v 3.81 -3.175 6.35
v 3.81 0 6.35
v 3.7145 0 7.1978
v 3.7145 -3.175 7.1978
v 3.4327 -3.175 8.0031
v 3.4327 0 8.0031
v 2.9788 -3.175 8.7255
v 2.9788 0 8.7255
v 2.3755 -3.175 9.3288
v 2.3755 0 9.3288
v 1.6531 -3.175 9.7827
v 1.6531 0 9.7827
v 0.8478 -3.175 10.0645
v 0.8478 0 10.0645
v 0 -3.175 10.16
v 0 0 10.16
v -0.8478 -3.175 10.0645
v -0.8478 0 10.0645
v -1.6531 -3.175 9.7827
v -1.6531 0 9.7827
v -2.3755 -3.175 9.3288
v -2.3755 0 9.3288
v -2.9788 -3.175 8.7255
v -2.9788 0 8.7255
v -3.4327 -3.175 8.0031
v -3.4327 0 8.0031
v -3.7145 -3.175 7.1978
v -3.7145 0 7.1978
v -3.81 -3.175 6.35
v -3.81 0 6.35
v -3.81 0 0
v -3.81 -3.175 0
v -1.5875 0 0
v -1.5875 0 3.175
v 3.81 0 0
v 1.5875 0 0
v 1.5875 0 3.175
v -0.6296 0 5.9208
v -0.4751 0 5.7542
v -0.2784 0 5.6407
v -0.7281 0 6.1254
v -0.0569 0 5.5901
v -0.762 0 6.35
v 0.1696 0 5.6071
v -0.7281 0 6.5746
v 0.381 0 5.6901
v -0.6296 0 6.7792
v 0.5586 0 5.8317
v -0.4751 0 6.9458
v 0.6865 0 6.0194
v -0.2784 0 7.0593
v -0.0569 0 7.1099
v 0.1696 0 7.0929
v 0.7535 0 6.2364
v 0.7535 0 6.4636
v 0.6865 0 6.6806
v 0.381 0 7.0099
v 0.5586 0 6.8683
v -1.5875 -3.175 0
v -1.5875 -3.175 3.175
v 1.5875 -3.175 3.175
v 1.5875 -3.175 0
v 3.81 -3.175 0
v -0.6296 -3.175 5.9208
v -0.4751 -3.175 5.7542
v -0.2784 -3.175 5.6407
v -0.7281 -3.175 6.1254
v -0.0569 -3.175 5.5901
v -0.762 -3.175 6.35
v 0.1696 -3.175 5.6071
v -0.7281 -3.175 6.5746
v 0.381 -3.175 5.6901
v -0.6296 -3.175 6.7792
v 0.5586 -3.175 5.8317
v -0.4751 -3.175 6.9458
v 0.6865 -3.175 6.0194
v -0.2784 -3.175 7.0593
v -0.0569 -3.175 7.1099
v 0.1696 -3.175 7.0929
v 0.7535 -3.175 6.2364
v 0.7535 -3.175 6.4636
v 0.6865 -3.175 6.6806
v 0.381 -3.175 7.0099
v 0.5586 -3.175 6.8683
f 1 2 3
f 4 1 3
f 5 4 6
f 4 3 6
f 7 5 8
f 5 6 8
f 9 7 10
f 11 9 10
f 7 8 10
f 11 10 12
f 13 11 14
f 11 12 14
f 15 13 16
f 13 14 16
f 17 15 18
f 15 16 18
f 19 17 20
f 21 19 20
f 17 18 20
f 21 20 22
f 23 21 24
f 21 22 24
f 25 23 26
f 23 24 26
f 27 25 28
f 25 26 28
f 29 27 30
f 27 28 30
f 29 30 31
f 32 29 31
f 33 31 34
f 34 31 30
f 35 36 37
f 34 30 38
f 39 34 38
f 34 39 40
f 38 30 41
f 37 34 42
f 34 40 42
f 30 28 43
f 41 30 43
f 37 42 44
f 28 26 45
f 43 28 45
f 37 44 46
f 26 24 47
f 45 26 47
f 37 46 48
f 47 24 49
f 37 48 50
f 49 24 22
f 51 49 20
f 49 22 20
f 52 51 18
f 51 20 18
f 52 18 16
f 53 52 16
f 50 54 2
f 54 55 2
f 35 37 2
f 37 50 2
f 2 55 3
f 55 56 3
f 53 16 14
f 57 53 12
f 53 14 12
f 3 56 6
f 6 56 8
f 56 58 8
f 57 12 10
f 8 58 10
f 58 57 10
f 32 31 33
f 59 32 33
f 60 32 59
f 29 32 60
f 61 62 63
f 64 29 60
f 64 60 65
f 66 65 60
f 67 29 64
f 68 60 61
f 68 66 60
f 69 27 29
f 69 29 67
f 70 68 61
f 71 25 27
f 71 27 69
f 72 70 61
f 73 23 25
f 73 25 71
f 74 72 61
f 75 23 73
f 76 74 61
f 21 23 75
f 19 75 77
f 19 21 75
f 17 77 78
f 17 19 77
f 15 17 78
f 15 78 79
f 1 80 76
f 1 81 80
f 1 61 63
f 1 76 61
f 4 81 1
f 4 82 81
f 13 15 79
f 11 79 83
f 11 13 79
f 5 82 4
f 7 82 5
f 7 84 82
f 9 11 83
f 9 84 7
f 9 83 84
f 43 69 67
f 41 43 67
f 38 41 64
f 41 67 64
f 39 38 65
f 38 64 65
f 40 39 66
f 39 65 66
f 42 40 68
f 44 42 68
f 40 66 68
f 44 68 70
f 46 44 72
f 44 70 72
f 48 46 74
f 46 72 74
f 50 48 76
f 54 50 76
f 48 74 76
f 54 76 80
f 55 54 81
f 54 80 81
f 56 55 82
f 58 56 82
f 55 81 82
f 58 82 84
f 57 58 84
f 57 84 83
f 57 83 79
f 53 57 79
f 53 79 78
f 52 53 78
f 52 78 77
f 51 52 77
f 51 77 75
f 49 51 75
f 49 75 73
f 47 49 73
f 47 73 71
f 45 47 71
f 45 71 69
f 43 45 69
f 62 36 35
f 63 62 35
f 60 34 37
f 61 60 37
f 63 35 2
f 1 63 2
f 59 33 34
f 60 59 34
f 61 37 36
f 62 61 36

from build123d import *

# Parameters (mm, degrees)
F1_DEPTH = 3.175
F2_D     = 1.524


with BuildPart() as f1:
    # F0 (on Front) → F1 (new body)
    with BuildSketch(Plane.XZ):
        with BuildLine():
            Line((-3.81, 6.35), (-3.81, 0))
            Line((-3.81, 0), (-1.5875, 0))
            Line((-1.5875, 0), (-1.5875, 3.175))
            Line((-1.5875, 3.175), (1.5875, 3.175))
            Line((1.5875, 3.175), (1.5875, 0))
            Line((1.5875, 0), (3.81, 0))
            Line((3.81, 0), (3.81, 6.35))
            ThreePointArc((3.81, 6.35), (0, 10.16), (-3.81, 6.35))
        make_face()
    extrude(amount=F1_DEPTH)

    # F2 (through all)
    with Locations(Plane(origin=(0, 0, 0), x_dir=(1, 0, 0), z_dir=(0, 1, 0))):
        with Locations((0, -6.35)):
            Hole(F2_D / 2)


solid = f1.part
